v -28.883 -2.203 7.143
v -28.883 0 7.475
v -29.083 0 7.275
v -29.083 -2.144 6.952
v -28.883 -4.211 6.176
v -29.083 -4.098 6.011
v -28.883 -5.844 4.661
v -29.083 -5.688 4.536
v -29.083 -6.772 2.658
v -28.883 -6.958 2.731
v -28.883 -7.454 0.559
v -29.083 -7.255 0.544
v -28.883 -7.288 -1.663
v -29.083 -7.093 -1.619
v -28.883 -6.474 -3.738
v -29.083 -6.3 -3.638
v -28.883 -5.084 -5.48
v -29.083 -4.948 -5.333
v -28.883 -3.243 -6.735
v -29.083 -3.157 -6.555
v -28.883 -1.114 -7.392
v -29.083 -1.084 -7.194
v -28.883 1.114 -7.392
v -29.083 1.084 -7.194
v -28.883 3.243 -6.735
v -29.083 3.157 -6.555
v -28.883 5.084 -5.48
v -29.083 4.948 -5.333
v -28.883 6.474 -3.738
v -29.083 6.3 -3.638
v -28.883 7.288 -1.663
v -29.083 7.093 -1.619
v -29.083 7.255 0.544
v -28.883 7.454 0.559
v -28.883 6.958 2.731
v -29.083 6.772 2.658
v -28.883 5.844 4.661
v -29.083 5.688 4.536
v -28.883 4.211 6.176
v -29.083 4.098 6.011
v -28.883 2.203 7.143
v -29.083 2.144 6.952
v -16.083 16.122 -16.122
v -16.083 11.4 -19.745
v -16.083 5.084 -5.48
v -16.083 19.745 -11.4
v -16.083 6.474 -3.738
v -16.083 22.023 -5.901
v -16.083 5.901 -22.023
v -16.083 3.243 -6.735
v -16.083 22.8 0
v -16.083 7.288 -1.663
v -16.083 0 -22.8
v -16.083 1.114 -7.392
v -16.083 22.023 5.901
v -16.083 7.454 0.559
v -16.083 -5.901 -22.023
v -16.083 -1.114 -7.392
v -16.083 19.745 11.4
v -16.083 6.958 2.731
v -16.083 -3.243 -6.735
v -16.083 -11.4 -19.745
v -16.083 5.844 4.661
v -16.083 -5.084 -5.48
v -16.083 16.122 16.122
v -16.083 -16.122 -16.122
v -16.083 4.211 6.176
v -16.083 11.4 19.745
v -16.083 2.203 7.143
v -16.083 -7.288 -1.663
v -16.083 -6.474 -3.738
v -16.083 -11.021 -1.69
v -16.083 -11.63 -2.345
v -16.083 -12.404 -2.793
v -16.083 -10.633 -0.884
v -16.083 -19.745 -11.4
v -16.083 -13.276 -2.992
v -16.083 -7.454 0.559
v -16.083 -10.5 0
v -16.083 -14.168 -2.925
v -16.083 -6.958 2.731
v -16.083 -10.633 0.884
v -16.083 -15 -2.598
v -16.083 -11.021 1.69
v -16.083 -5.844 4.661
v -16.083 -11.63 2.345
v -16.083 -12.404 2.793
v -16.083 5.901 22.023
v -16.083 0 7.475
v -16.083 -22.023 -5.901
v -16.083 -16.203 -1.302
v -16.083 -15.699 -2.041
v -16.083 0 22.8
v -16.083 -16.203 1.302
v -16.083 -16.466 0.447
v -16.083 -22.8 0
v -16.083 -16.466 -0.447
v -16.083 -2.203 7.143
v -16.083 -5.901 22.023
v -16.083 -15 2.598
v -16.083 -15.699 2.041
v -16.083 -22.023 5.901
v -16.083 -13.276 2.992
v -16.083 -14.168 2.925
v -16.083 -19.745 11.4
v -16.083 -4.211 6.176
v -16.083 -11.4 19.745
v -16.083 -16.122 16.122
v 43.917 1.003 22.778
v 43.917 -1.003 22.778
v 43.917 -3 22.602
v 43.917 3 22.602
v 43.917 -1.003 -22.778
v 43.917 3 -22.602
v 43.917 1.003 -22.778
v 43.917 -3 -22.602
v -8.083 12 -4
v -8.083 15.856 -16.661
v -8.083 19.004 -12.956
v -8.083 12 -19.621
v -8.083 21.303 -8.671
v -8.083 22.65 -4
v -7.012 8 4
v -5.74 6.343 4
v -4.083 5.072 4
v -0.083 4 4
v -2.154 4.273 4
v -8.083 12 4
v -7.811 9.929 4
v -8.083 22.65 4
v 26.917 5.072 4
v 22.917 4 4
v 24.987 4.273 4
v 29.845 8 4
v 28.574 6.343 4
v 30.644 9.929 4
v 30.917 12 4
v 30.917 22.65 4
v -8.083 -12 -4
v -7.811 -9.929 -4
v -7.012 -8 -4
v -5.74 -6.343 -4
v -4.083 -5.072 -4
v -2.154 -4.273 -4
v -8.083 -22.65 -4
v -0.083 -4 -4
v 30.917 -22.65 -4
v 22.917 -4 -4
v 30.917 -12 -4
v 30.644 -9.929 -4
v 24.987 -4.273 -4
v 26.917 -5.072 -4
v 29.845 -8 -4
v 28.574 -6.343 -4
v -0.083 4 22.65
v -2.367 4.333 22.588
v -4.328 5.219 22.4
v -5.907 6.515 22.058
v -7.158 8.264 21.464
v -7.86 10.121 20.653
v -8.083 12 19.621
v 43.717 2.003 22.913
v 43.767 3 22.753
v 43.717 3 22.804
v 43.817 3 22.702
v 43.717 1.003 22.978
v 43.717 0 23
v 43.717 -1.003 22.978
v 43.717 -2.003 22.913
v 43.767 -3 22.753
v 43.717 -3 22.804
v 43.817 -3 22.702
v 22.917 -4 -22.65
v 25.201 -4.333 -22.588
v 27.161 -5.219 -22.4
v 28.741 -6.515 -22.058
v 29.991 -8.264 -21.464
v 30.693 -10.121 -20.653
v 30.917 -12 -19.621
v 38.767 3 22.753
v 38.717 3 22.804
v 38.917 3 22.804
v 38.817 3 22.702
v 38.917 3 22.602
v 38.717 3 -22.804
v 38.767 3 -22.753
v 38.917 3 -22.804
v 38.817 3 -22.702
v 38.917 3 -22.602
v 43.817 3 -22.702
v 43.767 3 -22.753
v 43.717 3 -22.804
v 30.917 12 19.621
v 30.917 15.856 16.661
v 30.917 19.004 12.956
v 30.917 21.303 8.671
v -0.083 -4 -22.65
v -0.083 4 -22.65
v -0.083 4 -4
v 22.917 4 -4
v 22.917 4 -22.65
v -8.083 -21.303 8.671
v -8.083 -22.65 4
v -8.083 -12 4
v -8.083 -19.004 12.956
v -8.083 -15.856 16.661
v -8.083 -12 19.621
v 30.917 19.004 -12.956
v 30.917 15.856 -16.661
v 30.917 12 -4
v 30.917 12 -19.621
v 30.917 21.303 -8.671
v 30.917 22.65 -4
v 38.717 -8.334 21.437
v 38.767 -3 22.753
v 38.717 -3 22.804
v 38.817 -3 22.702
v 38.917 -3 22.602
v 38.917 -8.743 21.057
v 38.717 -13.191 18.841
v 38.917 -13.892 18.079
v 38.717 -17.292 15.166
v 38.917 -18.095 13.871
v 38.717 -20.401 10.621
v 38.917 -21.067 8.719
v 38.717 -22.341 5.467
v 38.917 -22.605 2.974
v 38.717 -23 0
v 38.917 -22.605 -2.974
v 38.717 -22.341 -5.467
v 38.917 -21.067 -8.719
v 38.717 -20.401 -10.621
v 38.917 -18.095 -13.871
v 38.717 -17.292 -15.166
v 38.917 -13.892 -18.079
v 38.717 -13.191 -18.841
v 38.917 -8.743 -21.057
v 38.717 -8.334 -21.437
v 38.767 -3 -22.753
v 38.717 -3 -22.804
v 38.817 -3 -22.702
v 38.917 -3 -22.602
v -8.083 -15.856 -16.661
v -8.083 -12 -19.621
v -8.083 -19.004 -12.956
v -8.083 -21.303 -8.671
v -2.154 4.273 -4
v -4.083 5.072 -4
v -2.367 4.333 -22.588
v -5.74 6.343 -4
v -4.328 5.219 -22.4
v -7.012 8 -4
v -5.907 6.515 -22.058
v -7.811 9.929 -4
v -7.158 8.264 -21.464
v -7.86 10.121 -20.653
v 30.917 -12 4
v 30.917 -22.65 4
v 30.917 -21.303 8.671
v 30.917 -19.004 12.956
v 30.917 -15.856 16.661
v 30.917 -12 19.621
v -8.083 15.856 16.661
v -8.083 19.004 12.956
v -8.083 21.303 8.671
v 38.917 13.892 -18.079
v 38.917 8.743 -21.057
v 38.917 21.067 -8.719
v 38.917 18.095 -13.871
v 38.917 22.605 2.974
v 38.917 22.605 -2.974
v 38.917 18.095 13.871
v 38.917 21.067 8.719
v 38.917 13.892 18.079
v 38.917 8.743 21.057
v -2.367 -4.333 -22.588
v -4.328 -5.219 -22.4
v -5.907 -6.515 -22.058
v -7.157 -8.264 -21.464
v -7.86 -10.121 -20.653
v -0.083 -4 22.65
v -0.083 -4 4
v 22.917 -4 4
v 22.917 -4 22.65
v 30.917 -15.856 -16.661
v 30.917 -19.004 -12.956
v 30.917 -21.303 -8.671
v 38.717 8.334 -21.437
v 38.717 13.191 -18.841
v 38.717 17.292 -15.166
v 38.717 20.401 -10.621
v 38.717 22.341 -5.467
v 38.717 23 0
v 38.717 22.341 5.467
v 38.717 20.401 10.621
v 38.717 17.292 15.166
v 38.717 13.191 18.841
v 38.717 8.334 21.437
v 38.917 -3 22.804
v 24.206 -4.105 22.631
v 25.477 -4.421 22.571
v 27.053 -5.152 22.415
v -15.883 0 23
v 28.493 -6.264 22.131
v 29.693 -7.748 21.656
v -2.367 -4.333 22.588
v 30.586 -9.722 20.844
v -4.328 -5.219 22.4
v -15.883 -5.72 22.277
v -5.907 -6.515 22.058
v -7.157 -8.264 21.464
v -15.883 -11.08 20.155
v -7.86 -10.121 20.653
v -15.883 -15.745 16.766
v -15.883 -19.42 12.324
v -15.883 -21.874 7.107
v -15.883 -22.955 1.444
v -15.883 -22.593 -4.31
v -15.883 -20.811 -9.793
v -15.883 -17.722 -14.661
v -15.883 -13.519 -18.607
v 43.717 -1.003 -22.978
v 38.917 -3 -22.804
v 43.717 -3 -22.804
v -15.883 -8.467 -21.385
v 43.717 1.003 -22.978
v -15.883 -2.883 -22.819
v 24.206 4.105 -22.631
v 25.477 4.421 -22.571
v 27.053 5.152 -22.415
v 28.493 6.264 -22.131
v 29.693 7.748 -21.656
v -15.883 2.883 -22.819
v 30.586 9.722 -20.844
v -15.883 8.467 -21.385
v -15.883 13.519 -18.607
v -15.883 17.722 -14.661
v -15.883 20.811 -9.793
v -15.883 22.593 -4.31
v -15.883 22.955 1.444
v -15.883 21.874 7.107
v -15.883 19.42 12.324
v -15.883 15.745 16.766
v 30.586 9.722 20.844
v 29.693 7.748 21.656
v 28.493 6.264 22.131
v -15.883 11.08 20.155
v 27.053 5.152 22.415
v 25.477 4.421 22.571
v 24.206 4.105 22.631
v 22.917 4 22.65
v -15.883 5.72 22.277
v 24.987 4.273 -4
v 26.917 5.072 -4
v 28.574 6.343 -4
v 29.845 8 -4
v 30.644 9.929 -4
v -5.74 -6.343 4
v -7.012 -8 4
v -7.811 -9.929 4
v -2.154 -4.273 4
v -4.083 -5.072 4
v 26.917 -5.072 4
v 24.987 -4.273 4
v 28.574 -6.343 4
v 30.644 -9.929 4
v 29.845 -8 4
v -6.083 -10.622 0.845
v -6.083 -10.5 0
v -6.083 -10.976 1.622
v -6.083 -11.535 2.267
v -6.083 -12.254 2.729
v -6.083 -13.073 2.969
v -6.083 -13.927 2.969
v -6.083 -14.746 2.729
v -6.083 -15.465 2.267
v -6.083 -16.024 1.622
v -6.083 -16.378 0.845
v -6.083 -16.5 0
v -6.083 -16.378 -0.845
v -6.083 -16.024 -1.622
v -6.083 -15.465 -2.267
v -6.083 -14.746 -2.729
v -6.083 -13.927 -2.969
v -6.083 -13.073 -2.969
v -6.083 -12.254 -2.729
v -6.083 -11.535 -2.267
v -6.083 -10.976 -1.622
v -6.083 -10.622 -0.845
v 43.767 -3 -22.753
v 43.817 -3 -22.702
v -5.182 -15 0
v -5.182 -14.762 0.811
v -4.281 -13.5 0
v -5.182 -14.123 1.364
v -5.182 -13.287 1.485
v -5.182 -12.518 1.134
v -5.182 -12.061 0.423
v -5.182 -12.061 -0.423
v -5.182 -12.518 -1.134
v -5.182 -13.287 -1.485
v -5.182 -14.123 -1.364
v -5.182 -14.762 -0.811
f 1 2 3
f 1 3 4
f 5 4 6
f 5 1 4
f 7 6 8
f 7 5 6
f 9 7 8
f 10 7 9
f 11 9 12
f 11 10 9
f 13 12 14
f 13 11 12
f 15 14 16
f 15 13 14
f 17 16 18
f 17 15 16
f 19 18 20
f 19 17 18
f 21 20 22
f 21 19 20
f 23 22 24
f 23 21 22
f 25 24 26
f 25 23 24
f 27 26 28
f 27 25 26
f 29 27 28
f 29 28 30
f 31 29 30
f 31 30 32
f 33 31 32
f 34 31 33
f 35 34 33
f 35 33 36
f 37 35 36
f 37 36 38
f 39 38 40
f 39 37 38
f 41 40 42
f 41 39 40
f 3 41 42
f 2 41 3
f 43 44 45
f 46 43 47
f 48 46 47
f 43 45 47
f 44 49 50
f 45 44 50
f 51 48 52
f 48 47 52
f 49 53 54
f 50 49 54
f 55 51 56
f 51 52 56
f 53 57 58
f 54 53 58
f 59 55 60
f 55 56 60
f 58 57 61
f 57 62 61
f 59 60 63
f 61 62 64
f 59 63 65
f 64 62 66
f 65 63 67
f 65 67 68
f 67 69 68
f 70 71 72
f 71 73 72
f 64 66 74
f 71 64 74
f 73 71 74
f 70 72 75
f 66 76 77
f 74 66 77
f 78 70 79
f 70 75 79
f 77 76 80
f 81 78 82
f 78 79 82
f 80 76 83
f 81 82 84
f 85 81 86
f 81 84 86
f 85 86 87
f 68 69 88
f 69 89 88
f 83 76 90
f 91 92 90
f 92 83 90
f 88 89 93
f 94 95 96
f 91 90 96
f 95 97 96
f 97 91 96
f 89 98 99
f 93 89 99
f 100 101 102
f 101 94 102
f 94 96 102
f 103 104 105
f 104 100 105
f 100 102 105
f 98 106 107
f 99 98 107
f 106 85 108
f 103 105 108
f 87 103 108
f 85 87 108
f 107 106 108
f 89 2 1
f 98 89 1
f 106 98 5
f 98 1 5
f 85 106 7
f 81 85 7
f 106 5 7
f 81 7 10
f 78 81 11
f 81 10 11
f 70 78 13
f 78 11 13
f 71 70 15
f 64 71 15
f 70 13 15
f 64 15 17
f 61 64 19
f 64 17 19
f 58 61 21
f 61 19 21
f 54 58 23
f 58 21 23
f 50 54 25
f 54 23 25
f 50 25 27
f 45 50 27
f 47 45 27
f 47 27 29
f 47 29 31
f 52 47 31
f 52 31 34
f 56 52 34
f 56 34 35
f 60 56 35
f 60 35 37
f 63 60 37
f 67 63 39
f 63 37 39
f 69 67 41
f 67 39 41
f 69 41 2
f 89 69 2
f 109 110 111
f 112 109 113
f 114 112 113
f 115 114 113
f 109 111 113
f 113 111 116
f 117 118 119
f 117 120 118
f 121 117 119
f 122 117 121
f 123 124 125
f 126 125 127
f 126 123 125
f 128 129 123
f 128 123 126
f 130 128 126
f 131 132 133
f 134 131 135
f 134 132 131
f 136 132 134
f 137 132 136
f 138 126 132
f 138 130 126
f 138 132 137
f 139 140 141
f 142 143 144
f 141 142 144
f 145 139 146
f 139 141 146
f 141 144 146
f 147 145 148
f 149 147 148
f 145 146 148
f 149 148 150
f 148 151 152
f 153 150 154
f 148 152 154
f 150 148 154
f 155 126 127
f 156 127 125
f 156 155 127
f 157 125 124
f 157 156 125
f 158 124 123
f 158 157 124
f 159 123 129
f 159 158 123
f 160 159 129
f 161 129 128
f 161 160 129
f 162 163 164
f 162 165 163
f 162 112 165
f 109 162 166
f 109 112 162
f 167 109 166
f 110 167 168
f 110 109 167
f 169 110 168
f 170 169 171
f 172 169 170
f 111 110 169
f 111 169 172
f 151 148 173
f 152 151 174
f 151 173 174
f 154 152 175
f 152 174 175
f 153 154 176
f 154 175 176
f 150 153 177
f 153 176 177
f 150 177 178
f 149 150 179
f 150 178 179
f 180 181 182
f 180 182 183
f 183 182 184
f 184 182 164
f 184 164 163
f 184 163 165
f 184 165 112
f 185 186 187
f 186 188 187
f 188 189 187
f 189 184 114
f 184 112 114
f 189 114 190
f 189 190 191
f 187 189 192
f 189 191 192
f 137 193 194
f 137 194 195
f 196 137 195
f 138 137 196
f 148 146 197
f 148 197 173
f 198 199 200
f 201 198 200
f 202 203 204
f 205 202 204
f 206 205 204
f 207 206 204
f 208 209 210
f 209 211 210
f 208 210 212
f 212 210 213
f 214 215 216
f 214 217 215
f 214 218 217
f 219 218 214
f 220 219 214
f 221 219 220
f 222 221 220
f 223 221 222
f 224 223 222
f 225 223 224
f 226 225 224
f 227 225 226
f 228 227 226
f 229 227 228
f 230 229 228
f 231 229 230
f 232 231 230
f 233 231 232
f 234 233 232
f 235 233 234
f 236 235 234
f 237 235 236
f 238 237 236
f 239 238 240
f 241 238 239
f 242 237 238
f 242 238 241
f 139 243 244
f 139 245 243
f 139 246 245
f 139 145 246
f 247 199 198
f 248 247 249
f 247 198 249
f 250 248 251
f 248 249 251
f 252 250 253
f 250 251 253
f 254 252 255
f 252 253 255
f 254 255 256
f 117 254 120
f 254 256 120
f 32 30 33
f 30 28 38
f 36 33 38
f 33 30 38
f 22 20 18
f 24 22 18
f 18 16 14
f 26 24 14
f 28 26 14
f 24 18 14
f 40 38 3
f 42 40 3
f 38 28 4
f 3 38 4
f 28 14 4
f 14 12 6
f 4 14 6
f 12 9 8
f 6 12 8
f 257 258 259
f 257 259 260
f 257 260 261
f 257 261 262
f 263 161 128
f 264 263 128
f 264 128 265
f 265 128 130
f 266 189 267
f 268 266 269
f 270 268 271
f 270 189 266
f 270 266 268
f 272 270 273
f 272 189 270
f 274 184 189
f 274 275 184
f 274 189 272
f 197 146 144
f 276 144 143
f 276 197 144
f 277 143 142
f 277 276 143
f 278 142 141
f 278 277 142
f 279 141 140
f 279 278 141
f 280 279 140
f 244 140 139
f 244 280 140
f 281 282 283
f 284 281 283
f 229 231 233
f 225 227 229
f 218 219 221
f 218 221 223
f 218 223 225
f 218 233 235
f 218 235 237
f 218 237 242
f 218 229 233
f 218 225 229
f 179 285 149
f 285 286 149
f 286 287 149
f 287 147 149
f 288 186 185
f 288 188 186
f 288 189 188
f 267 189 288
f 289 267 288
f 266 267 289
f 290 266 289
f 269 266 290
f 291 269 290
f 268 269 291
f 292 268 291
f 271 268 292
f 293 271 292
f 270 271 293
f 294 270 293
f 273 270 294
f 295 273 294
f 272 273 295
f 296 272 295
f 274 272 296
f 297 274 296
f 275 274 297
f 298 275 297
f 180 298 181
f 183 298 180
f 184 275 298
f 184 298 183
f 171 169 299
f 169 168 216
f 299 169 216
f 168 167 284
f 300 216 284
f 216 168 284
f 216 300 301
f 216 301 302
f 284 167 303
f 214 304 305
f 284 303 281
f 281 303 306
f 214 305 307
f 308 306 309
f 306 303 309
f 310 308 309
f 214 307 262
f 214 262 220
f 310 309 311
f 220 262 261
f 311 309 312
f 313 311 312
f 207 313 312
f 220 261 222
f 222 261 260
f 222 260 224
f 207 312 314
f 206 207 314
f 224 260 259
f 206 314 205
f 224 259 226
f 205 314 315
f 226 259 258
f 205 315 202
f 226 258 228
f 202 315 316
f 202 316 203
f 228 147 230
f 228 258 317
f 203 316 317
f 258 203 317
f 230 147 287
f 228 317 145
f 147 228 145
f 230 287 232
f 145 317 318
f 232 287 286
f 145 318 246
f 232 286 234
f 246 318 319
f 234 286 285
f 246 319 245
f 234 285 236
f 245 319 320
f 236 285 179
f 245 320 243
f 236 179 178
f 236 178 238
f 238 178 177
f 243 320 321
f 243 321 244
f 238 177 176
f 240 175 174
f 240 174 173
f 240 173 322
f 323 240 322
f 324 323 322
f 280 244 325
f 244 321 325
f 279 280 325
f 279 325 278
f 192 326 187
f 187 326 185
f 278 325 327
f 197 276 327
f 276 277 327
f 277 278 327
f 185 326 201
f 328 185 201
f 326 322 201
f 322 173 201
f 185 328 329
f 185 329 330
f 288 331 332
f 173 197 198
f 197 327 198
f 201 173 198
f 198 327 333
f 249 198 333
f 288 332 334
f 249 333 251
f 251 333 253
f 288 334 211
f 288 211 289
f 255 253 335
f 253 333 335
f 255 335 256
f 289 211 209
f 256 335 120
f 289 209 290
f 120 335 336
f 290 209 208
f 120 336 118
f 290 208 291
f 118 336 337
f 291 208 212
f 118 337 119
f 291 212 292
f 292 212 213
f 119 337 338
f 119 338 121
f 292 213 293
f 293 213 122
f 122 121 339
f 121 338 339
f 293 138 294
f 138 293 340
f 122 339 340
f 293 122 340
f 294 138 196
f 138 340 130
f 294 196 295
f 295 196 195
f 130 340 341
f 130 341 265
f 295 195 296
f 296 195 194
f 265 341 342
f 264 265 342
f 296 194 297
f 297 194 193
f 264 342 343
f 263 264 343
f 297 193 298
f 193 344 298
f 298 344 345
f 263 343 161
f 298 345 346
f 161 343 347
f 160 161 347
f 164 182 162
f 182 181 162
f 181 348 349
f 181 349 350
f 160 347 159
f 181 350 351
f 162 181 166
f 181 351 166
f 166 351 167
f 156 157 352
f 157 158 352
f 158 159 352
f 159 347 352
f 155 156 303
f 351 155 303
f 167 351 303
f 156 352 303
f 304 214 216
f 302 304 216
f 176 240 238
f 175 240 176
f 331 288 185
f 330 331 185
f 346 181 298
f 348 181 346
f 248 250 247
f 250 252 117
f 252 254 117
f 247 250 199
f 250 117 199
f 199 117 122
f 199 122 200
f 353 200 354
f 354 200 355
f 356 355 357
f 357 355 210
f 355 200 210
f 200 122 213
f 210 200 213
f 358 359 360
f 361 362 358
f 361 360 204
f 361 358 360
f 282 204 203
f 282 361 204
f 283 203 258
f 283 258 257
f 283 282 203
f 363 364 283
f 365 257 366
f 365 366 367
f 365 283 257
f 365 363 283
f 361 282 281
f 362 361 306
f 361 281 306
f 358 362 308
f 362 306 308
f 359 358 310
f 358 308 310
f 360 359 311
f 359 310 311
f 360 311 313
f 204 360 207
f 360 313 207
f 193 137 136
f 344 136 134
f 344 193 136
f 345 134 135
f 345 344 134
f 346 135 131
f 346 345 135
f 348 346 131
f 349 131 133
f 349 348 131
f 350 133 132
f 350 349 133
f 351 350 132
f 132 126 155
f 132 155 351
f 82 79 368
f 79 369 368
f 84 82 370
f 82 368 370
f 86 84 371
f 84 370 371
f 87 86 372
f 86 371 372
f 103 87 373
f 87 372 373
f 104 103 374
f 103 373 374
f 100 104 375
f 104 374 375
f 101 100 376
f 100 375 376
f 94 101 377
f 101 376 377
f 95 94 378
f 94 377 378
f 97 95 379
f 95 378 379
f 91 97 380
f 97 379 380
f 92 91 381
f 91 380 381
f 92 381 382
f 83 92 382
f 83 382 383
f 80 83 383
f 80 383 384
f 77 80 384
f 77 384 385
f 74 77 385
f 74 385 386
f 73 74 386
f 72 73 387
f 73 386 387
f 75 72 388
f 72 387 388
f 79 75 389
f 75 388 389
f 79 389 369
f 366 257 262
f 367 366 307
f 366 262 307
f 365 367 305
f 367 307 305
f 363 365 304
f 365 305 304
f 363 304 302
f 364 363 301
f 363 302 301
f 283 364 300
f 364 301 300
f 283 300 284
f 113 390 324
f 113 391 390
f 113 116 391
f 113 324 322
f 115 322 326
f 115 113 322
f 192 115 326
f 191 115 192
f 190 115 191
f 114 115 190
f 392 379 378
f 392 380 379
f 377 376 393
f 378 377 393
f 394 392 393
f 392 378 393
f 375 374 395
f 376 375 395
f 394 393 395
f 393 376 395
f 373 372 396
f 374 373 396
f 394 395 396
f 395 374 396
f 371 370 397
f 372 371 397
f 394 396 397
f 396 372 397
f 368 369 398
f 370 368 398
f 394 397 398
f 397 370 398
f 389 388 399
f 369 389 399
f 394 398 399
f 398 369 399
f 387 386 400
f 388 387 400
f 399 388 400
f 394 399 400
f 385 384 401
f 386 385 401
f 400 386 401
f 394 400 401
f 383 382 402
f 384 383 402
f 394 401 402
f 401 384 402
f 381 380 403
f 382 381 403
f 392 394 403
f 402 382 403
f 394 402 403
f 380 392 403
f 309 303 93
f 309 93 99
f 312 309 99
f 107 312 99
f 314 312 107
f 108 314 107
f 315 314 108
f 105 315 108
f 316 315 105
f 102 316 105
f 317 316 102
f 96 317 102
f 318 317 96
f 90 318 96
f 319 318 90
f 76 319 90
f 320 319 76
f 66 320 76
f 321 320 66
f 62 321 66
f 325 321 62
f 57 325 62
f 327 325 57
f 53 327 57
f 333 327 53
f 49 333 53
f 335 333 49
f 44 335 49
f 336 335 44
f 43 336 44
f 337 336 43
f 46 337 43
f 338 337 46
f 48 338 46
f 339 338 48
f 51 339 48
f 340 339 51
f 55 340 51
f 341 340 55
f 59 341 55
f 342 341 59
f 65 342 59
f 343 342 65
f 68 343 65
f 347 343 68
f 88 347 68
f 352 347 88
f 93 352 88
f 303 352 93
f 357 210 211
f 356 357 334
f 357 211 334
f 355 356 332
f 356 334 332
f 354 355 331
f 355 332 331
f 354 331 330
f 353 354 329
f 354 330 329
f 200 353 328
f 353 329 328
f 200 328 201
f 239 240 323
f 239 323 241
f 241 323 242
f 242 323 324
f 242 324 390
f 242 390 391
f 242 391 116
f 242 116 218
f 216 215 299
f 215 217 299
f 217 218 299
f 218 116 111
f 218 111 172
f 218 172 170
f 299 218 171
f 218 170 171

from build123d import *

# Parameters (mm, degrees)
F3_DEPTH  = 5
F6_W      = 39
F6_H      = 21.8819705509
F6_H_2    = 21.9819051884
F7_DEPTH  = 18.6505033058
F8_W      = 39
F8_H      = 30.9849461095
F8_H_2    = 27.3872321026
F9_DEPTH  = 18.6505033058
F11_D     = 6
F11_DEPTH = 10
F11_TIP   = 1.8025818571
F12_SIZE  = 0.2
F13_R     = 8


with BuildPart() as f1:
    # F0 (on Front) → F1 (revolve)
    with BuildSketch(Plane.XZ):
        Polygon((-29.0833324906, 7.475), (-29.0833324906, 0), (43.9166675094, 0), (43.9166675094, 23), (-16.0833324906, 23), (-16.0833324906, 7.475), align=None)
    revolve(axis=Axis((6.4323022962, 0, 0), (1, 0, 0)))

    # F2 (on face) → F3 (cut)
    with BuildSketch(Plane.YZ.offset(43.9166675094)):
        with BuildLine():
            Line((-3, -22.803508502), (-3, 22.803508502))
            ThreePointArc((-3, 22.803508502), (-23, 0), (-3, -22.803508502))
        make_face()
        with BuildLine():
            ThreePointArc((23, 0), (17.2916164658, 15.1657508881), (3, 22.803508502))
            Line((3, 22.803508502), (3, -22.803508502))
            ThreePointArc((3, -22.803508502), (17.2916164658, -15.1657508881), (23, 0))
        make_face()
    extrude(amount=-F3_DEPTH, mode=Mode.SUBTRACT)

    # F6 (on offset) → F7 (cut, through all)
    with BuildSketch(Plane.XY.offset(4)):
        with Locations((11.4166675094, 14.9409852754)):
            Rectangle(F6_W, F6_H)
        with Locations((11.4166675094, -14.9909525942)):
            Rectangle(F6_W, F6_H_2)
    extrude(amount=F7_DEPTH, mode=Mode.SUBTRACT)

    # F8 (on offset) → F9 (cut, through all)
    with BuildSketch(Plane.XY.offset(-4)):
        with Locations((11.4166675094, -19.4924730548)):
            Rectangle(F8_W, F8_H)
        with Locations((11.4166675094, 17.6936160513)):
            Rectangle(F8_W, F8_H_2)
    extrude(amount=-F9_DEPTH, mode=Mode.SUBTRACT)

    # F11
    with Locations(Plane(origin=(-16.0833324906, 0, 0), x_dir=(0, -1, 0), z_dir=(-1, 0, 0))):
        with Locations((13.5, 0)):
            Hole(F11_D / 2, depth=F11_DEPTH)
            with Locations((0, 0, -(F11_DEPTH + F11_TIP / 2))):  # 118° drill point
                Cone(0, F11_D / 2, F11_TIP, mode=Mode.SUBTRACT)

    # F12
    f12_edges = [f1.edges().sort_by_distance(p)[0] for p in [
        (-16.083332, 0, -23),
        (38.916668, 23, 0),
        (38.916668, -23, 0),
        (43.916668, 1.503214, 22.950825),
        (43.916668, 0, -23),
        (43.916668, -1.503214, 22.950825),
        (-29.083332, 0, -7.475),
    ]]
    chamfer(f12_edges, length=F12_SIZE)

    # F13
    f13_edges = [f1.edges().sort_by_distance(p)[0] for p in [
        (-8.083332, -4, 13.324752),
        (30.916668, -4, 13.324752),
        (30.916668, 4, 13.324752),
        (-8.083332, 4, 13.324752),
        (-8.083332, -4, -13.324752),
        (30.916668, -4, -13.324752),
        (-8.083332, 4, -13.324752),
        (30.916668, 4, -13.324752),
    ]]
    fillet(f13_edges, radius=F13_R)


solid = f1.part
